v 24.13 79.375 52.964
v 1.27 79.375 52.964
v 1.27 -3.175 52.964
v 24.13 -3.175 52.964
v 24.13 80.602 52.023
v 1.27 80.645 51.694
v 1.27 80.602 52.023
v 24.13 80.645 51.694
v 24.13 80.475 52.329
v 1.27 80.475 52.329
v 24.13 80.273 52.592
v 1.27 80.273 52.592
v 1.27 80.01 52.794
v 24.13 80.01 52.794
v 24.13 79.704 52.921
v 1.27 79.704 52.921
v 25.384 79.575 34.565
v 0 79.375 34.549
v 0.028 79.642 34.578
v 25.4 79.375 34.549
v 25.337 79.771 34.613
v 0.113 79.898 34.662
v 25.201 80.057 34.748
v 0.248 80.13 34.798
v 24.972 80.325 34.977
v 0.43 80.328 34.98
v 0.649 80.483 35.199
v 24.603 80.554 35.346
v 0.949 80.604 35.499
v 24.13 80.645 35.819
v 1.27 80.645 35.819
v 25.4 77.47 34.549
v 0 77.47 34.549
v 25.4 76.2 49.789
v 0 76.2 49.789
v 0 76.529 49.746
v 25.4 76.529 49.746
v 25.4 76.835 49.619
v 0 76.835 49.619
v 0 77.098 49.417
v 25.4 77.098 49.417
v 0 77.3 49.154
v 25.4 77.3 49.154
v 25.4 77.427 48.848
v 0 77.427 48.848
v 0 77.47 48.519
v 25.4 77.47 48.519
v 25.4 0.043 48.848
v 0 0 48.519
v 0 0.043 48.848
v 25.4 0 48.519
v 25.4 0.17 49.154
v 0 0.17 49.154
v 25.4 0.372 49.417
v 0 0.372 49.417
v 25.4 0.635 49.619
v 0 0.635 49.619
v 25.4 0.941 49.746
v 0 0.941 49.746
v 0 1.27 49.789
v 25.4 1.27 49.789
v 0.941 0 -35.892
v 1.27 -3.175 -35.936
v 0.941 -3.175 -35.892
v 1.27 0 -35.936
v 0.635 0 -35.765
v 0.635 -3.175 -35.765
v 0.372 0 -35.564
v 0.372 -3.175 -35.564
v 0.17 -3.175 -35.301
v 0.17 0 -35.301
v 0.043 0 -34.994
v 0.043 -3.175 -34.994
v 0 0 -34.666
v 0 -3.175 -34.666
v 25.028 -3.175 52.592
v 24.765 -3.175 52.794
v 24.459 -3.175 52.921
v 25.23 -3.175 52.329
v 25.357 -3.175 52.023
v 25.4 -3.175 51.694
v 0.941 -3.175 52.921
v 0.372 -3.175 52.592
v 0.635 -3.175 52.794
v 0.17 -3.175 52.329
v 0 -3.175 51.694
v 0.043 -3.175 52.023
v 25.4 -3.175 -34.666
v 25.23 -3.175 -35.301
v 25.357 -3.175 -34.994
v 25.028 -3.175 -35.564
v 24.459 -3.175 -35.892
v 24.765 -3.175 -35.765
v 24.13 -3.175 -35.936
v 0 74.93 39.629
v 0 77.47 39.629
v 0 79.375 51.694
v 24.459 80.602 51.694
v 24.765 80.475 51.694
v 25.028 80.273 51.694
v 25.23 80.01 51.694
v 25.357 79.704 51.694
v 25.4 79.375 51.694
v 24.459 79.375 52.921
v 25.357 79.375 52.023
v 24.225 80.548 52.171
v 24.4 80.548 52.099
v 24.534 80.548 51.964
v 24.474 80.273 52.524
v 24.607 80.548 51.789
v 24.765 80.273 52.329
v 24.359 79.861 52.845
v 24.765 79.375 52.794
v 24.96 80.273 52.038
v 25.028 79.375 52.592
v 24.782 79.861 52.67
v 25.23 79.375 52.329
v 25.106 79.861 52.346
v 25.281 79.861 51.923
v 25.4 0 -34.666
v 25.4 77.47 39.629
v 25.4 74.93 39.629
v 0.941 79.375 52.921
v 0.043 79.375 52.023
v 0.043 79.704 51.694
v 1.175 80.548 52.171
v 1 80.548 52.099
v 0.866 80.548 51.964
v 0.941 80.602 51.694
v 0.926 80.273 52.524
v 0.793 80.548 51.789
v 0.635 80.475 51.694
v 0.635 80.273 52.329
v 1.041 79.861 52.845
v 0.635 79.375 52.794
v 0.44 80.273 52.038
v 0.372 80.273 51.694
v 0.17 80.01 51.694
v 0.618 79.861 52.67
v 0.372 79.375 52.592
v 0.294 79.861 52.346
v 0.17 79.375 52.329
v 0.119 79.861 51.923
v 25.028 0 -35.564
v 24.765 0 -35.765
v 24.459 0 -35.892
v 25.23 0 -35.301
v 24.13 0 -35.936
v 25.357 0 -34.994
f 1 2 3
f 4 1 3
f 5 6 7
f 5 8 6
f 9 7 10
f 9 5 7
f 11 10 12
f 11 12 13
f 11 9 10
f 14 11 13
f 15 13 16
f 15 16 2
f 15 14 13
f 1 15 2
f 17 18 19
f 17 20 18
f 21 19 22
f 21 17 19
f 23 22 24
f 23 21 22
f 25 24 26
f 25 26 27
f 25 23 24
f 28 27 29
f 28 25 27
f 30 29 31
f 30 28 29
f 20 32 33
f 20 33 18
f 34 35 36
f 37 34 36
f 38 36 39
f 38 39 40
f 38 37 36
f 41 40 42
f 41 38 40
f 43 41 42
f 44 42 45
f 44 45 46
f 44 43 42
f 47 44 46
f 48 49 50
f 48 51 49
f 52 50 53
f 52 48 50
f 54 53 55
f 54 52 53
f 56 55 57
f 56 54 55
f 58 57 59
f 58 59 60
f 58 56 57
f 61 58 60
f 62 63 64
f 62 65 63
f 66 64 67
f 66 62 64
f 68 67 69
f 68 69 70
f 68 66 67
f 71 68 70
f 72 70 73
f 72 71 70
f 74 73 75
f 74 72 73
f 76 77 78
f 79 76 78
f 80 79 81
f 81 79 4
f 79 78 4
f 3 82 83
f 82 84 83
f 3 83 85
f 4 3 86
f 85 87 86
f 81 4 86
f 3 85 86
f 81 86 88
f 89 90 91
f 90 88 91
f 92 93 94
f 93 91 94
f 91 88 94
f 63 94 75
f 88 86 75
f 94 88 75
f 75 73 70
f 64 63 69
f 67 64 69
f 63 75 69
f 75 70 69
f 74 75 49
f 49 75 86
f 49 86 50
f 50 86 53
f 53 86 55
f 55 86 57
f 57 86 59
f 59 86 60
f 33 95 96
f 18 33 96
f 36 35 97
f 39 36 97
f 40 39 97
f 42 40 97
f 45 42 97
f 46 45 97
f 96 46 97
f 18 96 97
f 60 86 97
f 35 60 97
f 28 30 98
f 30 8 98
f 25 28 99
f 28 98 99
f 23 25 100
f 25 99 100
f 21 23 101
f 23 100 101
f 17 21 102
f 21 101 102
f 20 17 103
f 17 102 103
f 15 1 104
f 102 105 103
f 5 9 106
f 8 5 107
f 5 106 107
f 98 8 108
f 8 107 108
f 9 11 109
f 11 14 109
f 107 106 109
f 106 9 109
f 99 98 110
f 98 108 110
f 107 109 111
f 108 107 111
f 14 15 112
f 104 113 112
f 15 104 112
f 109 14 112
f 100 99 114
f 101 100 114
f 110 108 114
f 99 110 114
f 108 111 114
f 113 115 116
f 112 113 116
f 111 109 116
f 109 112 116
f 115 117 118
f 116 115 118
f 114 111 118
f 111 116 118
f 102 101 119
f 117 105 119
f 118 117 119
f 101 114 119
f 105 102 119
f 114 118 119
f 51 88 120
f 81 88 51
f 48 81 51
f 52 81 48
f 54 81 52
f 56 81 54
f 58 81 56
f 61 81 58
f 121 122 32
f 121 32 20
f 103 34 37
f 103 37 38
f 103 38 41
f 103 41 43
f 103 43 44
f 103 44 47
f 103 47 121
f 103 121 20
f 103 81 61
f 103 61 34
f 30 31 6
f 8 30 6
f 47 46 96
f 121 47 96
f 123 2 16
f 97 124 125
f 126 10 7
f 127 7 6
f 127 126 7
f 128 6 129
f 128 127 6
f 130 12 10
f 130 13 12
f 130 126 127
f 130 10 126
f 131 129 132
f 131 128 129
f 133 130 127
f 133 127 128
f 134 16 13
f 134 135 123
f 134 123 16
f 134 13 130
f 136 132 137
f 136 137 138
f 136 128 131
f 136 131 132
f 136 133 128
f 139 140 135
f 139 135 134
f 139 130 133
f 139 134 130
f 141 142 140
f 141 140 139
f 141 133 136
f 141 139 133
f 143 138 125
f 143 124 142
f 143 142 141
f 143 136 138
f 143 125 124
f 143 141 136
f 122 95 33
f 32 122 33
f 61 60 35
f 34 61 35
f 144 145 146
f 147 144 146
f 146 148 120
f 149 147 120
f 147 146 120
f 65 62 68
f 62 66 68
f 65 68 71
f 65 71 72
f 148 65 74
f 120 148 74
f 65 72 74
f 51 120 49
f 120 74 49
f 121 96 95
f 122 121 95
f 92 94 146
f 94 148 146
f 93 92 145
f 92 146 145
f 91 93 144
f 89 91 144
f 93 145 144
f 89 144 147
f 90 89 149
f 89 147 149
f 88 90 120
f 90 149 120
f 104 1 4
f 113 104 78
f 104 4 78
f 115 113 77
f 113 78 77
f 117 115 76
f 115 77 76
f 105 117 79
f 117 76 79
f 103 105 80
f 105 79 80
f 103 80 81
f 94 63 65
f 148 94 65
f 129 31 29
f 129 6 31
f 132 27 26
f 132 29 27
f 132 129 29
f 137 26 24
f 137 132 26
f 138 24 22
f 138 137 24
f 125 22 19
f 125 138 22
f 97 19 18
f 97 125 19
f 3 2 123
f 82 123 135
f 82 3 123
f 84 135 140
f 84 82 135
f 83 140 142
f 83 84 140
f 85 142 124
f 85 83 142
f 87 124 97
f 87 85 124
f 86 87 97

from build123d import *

# Parameters (mm, degrees)
F1_DEPTH = 25.4
F2_R     = 1.27
F3_R     = 1.27


with BuildPart() as f1:
    # F0 (on Right) → F1 (new body)
    with BuildSketch(Plane.YZ):
        Polygon((0, -35.935552), (0, 49.789448), (77.47, 49.789448), (77.47, 39.629448), (77.47, 34.549448), (80.645, 34.549448), (80.645, 49.789448), (80.645, 52.964448), (77.47, 52.964448), (0, 52.964448), (-3.175, 52.964448), (-3.175, 49.789448), (-3.175, 11.689448), (-3.175, -35.935552), align=None)
        Polygon((77.47, 34.549448), (77.47, 39.629448), (74.93, 39.629448), align=None)
    extrude(amount=F1_DEPTH)

    # F2
    f2_edges = [f1.edges().sort_by_distance(p)[0] for p in [
        (25.4, 38.735, 52.964448),
        (0, 38.735, 52.964448),
        (12.7, 80.645, 52.964448),
        (25.4, 80.645, 43.756948),
        (12.7, 80.645, 34.549448),
        (0, 80.645, 43.756948),
        (25.4, -1.5875, -35.935552),
        (0, -1.5875, -35.935552),
    ]]
    fillet(f2_edges, radius=F2_R)

    # F3
    f3_edges = [f1.edges().sort_by_distance(p)[0] for p in [
        (12.7, 0, 49.789448),
        (12.7, 77.47, 49.789448),
    ]]
    fillet(f3_edges, radius=F3_R)


solid = f1.part
